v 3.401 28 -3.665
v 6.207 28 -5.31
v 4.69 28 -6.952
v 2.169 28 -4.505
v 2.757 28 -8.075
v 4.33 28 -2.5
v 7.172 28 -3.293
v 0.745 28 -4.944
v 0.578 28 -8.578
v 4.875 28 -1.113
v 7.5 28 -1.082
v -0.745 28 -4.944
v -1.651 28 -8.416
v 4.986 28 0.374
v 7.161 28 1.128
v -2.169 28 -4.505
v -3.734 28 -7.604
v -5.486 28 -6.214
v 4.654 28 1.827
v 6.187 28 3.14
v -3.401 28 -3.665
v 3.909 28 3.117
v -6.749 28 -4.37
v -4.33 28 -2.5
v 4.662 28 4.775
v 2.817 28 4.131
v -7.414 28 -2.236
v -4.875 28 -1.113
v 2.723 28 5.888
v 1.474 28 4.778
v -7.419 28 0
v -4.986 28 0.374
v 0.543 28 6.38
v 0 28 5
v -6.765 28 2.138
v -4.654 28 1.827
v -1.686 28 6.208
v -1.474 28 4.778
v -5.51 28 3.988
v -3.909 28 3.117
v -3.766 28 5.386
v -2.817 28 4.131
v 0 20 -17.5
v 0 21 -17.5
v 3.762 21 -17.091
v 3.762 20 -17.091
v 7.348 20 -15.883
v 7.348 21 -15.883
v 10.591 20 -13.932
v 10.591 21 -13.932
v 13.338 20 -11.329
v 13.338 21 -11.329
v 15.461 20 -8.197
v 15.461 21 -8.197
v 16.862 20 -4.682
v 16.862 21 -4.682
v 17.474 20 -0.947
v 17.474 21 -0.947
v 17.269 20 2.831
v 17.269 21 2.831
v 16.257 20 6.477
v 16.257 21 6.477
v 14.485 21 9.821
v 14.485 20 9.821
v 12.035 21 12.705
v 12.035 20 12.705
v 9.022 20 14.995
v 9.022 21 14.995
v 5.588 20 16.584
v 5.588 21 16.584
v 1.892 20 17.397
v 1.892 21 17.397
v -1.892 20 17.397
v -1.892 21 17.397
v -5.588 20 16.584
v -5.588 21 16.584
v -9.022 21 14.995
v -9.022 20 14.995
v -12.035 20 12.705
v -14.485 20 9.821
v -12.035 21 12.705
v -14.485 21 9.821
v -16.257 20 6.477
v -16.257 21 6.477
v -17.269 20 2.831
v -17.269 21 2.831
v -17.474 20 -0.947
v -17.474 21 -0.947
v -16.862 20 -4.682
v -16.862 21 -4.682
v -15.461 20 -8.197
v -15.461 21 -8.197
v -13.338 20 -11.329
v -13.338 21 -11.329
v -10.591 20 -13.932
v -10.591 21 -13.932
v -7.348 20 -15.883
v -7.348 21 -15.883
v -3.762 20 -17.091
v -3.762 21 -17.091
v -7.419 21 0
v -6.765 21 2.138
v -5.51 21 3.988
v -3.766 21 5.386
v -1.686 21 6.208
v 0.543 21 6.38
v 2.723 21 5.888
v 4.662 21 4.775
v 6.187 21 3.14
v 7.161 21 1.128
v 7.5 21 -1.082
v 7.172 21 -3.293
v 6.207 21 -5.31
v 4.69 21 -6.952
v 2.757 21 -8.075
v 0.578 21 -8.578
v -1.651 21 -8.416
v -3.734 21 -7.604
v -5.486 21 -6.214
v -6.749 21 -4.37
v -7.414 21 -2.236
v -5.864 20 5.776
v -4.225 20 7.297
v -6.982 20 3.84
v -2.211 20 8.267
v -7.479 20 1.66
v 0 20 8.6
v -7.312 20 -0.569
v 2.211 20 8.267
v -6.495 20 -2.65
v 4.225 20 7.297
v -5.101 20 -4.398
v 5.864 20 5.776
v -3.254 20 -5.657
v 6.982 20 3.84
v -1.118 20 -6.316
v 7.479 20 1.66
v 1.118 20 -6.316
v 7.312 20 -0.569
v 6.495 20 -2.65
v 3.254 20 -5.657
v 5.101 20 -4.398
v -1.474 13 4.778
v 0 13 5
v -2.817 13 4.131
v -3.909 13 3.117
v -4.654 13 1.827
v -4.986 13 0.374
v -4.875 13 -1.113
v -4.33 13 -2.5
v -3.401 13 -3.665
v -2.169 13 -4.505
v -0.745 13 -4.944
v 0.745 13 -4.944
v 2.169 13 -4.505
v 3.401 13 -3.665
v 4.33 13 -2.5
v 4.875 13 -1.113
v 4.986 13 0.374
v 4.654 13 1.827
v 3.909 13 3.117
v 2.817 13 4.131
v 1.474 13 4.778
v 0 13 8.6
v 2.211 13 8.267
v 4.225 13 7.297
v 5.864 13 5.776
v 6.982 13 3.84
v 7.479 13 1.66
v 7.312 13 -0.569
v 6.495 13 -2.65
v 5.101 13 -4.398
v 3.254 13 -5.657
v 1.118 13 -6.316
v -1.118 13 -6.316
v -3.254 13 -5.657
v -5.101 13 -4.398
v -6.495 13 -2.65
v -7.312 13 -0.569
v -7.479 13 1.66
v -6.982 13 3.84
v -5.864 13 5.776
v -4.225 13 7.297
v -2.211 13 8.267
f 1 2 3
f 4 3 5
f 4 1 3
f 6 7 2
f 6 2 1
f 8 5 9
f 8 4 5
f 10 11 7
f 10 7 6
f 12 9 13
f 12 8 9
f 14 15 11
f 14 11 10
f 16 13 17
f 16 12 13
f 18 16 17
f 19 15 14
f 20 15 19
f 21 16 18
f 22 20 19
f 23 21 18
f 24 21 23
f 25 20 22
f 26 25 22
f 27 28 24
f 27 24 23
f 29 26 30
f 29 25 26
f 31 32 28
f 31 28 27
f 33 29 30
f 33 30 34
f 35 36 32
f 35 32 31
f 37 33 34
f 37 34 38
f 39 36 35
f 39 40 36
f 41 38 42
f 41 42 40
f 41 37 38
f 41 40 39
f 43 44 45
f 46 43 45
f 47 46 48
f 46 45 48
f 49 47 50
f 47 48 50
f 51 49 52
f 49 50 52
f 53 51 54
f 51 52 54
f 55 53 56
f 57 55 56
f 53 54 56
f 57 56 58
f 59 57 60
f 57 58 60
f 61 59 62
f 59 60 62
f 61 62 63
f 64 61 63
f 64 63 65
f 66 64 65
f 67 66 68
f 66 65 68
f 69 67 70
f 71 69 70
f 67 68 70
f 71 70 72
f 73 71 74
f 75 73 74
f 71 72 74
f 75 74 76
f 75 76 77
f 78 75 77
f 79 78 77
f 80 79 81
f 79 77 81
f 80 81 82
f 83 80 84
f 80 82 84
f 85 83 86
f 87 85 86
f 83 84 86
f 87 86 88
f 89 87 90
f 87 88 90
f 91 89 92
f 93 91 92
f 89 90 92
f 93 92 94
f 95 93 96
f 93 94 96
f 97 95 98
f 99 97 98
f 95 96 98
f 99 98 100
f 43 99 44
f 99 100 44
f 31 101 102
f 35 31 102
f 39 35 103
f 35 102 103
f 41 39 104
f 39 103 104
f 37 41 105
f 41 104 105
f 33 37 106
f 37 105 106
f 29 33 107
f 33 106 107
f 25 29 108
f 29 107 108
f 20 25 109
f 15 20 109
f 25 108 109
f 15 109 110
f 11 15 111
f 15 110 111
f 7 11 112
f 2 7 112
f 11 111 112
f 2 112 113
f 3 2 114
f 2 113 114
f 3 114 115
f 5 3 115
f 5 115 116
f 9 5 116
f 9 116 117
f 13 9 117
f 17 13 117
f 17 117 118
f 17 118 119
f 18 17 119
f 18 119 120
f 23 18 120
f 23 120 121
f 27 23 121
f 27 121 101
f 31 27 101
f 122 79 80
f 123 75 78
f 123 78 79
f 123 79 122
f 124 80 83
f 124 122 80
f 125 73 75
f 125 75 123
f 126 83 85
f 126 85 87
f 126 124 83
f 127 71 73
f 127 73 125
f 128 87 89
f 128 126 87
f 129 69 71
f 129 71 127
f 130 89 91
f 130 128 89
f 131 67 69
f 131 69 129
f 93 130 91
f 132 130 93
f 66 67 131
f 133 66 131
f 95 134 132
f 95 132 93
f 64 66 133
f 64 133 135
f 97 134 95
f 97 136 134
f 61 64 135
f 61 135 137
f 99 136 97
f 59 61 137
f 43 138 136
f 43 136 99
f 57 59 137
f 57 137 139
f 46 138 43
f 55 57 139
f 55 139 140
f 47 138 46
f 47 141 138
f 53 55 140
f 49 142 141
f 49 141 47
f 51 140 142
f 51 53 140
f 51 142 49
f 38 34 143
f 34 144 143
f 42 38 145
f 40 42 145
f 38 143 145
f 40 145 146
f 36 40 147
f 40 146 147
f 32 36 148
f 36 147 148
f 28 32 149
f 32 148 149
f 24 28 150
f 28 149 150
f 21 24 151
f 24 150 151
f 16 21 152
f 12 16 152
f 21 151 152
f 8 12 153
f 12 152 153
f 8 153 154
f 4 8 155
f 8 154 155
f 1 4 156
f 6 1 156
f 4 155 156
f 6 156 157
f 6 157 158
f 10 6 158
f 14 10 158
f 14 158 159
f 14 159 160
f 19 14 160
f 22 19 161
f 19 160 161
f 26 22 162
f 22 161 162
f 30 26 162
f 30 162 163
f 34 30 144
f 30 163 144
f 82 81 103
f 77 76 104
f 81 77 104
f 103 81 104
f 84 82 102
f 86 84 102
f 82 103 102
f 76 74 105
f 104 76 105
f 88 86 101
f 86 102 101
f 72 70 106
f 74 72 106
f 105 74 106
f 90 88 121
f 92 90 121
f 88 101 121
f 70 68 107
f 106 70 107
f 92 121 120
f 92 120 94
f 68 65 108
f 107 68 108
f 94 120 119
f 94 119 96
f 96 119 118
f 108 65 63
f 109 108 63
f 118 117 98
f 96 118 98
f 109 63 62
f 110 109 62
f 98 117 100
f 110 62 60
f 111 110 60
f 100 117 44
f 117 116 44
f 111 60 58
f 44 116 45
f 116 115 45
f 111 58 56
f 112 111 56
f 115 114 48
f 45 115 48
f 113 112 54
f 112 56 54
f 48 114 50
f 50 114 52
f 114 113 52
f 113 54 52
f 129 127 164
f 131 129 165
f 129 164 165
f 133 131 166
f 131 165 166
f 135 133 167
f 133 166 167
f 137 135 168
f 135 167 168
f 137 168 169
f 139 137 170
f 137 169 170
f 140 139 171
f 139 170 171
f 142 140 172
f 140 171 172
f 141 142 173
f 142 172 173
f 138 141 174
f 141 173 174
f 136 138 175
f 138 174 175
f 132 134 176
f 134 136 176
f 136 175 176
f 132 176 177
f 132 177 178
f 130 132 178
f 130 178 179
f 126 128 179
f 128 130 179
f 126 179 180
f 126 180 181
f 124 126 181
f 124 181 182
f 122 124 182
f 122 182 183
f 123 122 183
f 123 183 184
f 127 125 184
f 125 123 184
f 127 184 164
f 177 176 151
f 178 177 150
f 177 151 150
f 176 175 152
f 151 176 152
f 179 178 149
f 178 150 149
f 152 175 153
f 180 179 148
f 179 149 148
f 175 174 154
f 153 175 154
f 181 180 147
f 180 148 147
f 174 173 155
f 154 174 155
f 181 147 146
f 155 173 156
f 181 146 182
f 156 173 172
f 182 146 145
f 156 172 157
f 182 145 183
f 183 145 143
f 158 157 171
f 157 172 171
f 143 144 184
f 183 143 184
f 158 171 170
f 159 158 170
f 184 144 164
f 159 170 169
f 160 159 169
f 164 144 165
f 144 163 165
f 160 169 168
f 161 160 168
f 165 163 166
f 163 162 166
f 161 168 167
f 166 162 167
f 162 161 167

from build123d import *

# Parameters (mm, degrees)
SKETCH1_R           = 5
BOSS_EXTRUDE1_DEPTH = 13
SKETCH2_R           = 7.5
BOSS_EXTRUDE2_DEPTH = 8
SKETCH3_R           = 7.5
BOSS_EXTRUDE3_DEPTH = 7
SKETCH4_R           = 5
BOSS_EXTRUDE4_DEPTH = 13
SKETCH5_R           = 5
CUT_EXTRUDE1_DEPTH  = 43.558312936
SKETCH6_R           = 17.5
BOSS_EXTRUDE5_DEPTH = 1
SKETCH7_R           = 5
CUT_EXTRUDE2_DEPTH  = 27.009613607


with BuildPart() as part:
    # Sketch1 → Boss-Extrude1 (new body)
    with BuildSketch(Plane(origin=(0, 0, 0), x_dir=(1, 0, 0), z_dir=(0, 1, 0))):
        with Locations(Location((0, 0, 0), (0, 0, 90))):
            Circle(SKETCH1_R)
    extrude(amount=BOSS_EXTRUDE1_DEPTH)

    # Sketch2 → Boss-Extrude2 (add)
    with BuildSketch(Plane(origin=(0, 13, 0), x_dir=(1, 0, 0), z_dir=(0, 1, 0))):
        with Locations(Location((0, -1.1, 0), (0, 0, 270))):
            Circle(SKETCH2_R)
    extrude(amount=BOSS_EXTRUDE2_DEPTH)

    # Sketch3 → Boss-Extrude3 (add)
    with BuildSketch(Plane(origin=(0, 21, 0), x_dir=(1, 0, 0), z_dir=(0, 1, 0))):
        with Locations(Location((0, 1.1, 0), (0, 0, 188.433804098))):
            Circle(SKETCH3_R)
    extrude(amount=BOSS_EXTRUDE3_DEPTH)

    # Sketch4 → Boss-Extrude4 (add)
    with BuildSketch(Plane(origin=(0, 28, 0), x_dir=(1, 0, 0), z_dir=(0, 1, 0))):
        with Locations(Location((0, 0, 0), (0, 0, 90))):
            Circle(SKETCH4_R)
    extrude(amount=BOSS_EXTRUDE4_DEPTH)

    # Sketch5 → Cut-Extrude1 (cut, through all)
    with BuildSketch(Plane.XZ):
        with Locations(Location((0, 0, 0), (0, 0, 90))):
            Circle(SKETCH5_R)
    extrude(amount=-CUT_EXTRUDE1_DEPTH, mode=Mode.SUBTRACT)

    # Sketch6 → Boss-Extrude5 (add)
    with BuildSketch(Plane.XZ.offset(-21)):
        with Locations(Location((0, 0, 0), (0, 0, 270))):
            Circle(SKETCH6_R)
    extrude(amount=BOSS_EXTRUDE5_DEPTH)

    # Sketch7 → Cut-Extrude2 (cut, through all)
    with BuildSketch(Plane(origin=(0, 21, 0), x_dir=(1, 0, 0), z_dir=(0, 1, 0))):
        with Locations(Location((0, 0, 0), (0, 0, 270))):
            Circle(SKETCH7_R)
    extrude(amount=-CUT_EXTRUDE2_DEPTH, mode=Mode.SUBTRACT)


solid = part.part
